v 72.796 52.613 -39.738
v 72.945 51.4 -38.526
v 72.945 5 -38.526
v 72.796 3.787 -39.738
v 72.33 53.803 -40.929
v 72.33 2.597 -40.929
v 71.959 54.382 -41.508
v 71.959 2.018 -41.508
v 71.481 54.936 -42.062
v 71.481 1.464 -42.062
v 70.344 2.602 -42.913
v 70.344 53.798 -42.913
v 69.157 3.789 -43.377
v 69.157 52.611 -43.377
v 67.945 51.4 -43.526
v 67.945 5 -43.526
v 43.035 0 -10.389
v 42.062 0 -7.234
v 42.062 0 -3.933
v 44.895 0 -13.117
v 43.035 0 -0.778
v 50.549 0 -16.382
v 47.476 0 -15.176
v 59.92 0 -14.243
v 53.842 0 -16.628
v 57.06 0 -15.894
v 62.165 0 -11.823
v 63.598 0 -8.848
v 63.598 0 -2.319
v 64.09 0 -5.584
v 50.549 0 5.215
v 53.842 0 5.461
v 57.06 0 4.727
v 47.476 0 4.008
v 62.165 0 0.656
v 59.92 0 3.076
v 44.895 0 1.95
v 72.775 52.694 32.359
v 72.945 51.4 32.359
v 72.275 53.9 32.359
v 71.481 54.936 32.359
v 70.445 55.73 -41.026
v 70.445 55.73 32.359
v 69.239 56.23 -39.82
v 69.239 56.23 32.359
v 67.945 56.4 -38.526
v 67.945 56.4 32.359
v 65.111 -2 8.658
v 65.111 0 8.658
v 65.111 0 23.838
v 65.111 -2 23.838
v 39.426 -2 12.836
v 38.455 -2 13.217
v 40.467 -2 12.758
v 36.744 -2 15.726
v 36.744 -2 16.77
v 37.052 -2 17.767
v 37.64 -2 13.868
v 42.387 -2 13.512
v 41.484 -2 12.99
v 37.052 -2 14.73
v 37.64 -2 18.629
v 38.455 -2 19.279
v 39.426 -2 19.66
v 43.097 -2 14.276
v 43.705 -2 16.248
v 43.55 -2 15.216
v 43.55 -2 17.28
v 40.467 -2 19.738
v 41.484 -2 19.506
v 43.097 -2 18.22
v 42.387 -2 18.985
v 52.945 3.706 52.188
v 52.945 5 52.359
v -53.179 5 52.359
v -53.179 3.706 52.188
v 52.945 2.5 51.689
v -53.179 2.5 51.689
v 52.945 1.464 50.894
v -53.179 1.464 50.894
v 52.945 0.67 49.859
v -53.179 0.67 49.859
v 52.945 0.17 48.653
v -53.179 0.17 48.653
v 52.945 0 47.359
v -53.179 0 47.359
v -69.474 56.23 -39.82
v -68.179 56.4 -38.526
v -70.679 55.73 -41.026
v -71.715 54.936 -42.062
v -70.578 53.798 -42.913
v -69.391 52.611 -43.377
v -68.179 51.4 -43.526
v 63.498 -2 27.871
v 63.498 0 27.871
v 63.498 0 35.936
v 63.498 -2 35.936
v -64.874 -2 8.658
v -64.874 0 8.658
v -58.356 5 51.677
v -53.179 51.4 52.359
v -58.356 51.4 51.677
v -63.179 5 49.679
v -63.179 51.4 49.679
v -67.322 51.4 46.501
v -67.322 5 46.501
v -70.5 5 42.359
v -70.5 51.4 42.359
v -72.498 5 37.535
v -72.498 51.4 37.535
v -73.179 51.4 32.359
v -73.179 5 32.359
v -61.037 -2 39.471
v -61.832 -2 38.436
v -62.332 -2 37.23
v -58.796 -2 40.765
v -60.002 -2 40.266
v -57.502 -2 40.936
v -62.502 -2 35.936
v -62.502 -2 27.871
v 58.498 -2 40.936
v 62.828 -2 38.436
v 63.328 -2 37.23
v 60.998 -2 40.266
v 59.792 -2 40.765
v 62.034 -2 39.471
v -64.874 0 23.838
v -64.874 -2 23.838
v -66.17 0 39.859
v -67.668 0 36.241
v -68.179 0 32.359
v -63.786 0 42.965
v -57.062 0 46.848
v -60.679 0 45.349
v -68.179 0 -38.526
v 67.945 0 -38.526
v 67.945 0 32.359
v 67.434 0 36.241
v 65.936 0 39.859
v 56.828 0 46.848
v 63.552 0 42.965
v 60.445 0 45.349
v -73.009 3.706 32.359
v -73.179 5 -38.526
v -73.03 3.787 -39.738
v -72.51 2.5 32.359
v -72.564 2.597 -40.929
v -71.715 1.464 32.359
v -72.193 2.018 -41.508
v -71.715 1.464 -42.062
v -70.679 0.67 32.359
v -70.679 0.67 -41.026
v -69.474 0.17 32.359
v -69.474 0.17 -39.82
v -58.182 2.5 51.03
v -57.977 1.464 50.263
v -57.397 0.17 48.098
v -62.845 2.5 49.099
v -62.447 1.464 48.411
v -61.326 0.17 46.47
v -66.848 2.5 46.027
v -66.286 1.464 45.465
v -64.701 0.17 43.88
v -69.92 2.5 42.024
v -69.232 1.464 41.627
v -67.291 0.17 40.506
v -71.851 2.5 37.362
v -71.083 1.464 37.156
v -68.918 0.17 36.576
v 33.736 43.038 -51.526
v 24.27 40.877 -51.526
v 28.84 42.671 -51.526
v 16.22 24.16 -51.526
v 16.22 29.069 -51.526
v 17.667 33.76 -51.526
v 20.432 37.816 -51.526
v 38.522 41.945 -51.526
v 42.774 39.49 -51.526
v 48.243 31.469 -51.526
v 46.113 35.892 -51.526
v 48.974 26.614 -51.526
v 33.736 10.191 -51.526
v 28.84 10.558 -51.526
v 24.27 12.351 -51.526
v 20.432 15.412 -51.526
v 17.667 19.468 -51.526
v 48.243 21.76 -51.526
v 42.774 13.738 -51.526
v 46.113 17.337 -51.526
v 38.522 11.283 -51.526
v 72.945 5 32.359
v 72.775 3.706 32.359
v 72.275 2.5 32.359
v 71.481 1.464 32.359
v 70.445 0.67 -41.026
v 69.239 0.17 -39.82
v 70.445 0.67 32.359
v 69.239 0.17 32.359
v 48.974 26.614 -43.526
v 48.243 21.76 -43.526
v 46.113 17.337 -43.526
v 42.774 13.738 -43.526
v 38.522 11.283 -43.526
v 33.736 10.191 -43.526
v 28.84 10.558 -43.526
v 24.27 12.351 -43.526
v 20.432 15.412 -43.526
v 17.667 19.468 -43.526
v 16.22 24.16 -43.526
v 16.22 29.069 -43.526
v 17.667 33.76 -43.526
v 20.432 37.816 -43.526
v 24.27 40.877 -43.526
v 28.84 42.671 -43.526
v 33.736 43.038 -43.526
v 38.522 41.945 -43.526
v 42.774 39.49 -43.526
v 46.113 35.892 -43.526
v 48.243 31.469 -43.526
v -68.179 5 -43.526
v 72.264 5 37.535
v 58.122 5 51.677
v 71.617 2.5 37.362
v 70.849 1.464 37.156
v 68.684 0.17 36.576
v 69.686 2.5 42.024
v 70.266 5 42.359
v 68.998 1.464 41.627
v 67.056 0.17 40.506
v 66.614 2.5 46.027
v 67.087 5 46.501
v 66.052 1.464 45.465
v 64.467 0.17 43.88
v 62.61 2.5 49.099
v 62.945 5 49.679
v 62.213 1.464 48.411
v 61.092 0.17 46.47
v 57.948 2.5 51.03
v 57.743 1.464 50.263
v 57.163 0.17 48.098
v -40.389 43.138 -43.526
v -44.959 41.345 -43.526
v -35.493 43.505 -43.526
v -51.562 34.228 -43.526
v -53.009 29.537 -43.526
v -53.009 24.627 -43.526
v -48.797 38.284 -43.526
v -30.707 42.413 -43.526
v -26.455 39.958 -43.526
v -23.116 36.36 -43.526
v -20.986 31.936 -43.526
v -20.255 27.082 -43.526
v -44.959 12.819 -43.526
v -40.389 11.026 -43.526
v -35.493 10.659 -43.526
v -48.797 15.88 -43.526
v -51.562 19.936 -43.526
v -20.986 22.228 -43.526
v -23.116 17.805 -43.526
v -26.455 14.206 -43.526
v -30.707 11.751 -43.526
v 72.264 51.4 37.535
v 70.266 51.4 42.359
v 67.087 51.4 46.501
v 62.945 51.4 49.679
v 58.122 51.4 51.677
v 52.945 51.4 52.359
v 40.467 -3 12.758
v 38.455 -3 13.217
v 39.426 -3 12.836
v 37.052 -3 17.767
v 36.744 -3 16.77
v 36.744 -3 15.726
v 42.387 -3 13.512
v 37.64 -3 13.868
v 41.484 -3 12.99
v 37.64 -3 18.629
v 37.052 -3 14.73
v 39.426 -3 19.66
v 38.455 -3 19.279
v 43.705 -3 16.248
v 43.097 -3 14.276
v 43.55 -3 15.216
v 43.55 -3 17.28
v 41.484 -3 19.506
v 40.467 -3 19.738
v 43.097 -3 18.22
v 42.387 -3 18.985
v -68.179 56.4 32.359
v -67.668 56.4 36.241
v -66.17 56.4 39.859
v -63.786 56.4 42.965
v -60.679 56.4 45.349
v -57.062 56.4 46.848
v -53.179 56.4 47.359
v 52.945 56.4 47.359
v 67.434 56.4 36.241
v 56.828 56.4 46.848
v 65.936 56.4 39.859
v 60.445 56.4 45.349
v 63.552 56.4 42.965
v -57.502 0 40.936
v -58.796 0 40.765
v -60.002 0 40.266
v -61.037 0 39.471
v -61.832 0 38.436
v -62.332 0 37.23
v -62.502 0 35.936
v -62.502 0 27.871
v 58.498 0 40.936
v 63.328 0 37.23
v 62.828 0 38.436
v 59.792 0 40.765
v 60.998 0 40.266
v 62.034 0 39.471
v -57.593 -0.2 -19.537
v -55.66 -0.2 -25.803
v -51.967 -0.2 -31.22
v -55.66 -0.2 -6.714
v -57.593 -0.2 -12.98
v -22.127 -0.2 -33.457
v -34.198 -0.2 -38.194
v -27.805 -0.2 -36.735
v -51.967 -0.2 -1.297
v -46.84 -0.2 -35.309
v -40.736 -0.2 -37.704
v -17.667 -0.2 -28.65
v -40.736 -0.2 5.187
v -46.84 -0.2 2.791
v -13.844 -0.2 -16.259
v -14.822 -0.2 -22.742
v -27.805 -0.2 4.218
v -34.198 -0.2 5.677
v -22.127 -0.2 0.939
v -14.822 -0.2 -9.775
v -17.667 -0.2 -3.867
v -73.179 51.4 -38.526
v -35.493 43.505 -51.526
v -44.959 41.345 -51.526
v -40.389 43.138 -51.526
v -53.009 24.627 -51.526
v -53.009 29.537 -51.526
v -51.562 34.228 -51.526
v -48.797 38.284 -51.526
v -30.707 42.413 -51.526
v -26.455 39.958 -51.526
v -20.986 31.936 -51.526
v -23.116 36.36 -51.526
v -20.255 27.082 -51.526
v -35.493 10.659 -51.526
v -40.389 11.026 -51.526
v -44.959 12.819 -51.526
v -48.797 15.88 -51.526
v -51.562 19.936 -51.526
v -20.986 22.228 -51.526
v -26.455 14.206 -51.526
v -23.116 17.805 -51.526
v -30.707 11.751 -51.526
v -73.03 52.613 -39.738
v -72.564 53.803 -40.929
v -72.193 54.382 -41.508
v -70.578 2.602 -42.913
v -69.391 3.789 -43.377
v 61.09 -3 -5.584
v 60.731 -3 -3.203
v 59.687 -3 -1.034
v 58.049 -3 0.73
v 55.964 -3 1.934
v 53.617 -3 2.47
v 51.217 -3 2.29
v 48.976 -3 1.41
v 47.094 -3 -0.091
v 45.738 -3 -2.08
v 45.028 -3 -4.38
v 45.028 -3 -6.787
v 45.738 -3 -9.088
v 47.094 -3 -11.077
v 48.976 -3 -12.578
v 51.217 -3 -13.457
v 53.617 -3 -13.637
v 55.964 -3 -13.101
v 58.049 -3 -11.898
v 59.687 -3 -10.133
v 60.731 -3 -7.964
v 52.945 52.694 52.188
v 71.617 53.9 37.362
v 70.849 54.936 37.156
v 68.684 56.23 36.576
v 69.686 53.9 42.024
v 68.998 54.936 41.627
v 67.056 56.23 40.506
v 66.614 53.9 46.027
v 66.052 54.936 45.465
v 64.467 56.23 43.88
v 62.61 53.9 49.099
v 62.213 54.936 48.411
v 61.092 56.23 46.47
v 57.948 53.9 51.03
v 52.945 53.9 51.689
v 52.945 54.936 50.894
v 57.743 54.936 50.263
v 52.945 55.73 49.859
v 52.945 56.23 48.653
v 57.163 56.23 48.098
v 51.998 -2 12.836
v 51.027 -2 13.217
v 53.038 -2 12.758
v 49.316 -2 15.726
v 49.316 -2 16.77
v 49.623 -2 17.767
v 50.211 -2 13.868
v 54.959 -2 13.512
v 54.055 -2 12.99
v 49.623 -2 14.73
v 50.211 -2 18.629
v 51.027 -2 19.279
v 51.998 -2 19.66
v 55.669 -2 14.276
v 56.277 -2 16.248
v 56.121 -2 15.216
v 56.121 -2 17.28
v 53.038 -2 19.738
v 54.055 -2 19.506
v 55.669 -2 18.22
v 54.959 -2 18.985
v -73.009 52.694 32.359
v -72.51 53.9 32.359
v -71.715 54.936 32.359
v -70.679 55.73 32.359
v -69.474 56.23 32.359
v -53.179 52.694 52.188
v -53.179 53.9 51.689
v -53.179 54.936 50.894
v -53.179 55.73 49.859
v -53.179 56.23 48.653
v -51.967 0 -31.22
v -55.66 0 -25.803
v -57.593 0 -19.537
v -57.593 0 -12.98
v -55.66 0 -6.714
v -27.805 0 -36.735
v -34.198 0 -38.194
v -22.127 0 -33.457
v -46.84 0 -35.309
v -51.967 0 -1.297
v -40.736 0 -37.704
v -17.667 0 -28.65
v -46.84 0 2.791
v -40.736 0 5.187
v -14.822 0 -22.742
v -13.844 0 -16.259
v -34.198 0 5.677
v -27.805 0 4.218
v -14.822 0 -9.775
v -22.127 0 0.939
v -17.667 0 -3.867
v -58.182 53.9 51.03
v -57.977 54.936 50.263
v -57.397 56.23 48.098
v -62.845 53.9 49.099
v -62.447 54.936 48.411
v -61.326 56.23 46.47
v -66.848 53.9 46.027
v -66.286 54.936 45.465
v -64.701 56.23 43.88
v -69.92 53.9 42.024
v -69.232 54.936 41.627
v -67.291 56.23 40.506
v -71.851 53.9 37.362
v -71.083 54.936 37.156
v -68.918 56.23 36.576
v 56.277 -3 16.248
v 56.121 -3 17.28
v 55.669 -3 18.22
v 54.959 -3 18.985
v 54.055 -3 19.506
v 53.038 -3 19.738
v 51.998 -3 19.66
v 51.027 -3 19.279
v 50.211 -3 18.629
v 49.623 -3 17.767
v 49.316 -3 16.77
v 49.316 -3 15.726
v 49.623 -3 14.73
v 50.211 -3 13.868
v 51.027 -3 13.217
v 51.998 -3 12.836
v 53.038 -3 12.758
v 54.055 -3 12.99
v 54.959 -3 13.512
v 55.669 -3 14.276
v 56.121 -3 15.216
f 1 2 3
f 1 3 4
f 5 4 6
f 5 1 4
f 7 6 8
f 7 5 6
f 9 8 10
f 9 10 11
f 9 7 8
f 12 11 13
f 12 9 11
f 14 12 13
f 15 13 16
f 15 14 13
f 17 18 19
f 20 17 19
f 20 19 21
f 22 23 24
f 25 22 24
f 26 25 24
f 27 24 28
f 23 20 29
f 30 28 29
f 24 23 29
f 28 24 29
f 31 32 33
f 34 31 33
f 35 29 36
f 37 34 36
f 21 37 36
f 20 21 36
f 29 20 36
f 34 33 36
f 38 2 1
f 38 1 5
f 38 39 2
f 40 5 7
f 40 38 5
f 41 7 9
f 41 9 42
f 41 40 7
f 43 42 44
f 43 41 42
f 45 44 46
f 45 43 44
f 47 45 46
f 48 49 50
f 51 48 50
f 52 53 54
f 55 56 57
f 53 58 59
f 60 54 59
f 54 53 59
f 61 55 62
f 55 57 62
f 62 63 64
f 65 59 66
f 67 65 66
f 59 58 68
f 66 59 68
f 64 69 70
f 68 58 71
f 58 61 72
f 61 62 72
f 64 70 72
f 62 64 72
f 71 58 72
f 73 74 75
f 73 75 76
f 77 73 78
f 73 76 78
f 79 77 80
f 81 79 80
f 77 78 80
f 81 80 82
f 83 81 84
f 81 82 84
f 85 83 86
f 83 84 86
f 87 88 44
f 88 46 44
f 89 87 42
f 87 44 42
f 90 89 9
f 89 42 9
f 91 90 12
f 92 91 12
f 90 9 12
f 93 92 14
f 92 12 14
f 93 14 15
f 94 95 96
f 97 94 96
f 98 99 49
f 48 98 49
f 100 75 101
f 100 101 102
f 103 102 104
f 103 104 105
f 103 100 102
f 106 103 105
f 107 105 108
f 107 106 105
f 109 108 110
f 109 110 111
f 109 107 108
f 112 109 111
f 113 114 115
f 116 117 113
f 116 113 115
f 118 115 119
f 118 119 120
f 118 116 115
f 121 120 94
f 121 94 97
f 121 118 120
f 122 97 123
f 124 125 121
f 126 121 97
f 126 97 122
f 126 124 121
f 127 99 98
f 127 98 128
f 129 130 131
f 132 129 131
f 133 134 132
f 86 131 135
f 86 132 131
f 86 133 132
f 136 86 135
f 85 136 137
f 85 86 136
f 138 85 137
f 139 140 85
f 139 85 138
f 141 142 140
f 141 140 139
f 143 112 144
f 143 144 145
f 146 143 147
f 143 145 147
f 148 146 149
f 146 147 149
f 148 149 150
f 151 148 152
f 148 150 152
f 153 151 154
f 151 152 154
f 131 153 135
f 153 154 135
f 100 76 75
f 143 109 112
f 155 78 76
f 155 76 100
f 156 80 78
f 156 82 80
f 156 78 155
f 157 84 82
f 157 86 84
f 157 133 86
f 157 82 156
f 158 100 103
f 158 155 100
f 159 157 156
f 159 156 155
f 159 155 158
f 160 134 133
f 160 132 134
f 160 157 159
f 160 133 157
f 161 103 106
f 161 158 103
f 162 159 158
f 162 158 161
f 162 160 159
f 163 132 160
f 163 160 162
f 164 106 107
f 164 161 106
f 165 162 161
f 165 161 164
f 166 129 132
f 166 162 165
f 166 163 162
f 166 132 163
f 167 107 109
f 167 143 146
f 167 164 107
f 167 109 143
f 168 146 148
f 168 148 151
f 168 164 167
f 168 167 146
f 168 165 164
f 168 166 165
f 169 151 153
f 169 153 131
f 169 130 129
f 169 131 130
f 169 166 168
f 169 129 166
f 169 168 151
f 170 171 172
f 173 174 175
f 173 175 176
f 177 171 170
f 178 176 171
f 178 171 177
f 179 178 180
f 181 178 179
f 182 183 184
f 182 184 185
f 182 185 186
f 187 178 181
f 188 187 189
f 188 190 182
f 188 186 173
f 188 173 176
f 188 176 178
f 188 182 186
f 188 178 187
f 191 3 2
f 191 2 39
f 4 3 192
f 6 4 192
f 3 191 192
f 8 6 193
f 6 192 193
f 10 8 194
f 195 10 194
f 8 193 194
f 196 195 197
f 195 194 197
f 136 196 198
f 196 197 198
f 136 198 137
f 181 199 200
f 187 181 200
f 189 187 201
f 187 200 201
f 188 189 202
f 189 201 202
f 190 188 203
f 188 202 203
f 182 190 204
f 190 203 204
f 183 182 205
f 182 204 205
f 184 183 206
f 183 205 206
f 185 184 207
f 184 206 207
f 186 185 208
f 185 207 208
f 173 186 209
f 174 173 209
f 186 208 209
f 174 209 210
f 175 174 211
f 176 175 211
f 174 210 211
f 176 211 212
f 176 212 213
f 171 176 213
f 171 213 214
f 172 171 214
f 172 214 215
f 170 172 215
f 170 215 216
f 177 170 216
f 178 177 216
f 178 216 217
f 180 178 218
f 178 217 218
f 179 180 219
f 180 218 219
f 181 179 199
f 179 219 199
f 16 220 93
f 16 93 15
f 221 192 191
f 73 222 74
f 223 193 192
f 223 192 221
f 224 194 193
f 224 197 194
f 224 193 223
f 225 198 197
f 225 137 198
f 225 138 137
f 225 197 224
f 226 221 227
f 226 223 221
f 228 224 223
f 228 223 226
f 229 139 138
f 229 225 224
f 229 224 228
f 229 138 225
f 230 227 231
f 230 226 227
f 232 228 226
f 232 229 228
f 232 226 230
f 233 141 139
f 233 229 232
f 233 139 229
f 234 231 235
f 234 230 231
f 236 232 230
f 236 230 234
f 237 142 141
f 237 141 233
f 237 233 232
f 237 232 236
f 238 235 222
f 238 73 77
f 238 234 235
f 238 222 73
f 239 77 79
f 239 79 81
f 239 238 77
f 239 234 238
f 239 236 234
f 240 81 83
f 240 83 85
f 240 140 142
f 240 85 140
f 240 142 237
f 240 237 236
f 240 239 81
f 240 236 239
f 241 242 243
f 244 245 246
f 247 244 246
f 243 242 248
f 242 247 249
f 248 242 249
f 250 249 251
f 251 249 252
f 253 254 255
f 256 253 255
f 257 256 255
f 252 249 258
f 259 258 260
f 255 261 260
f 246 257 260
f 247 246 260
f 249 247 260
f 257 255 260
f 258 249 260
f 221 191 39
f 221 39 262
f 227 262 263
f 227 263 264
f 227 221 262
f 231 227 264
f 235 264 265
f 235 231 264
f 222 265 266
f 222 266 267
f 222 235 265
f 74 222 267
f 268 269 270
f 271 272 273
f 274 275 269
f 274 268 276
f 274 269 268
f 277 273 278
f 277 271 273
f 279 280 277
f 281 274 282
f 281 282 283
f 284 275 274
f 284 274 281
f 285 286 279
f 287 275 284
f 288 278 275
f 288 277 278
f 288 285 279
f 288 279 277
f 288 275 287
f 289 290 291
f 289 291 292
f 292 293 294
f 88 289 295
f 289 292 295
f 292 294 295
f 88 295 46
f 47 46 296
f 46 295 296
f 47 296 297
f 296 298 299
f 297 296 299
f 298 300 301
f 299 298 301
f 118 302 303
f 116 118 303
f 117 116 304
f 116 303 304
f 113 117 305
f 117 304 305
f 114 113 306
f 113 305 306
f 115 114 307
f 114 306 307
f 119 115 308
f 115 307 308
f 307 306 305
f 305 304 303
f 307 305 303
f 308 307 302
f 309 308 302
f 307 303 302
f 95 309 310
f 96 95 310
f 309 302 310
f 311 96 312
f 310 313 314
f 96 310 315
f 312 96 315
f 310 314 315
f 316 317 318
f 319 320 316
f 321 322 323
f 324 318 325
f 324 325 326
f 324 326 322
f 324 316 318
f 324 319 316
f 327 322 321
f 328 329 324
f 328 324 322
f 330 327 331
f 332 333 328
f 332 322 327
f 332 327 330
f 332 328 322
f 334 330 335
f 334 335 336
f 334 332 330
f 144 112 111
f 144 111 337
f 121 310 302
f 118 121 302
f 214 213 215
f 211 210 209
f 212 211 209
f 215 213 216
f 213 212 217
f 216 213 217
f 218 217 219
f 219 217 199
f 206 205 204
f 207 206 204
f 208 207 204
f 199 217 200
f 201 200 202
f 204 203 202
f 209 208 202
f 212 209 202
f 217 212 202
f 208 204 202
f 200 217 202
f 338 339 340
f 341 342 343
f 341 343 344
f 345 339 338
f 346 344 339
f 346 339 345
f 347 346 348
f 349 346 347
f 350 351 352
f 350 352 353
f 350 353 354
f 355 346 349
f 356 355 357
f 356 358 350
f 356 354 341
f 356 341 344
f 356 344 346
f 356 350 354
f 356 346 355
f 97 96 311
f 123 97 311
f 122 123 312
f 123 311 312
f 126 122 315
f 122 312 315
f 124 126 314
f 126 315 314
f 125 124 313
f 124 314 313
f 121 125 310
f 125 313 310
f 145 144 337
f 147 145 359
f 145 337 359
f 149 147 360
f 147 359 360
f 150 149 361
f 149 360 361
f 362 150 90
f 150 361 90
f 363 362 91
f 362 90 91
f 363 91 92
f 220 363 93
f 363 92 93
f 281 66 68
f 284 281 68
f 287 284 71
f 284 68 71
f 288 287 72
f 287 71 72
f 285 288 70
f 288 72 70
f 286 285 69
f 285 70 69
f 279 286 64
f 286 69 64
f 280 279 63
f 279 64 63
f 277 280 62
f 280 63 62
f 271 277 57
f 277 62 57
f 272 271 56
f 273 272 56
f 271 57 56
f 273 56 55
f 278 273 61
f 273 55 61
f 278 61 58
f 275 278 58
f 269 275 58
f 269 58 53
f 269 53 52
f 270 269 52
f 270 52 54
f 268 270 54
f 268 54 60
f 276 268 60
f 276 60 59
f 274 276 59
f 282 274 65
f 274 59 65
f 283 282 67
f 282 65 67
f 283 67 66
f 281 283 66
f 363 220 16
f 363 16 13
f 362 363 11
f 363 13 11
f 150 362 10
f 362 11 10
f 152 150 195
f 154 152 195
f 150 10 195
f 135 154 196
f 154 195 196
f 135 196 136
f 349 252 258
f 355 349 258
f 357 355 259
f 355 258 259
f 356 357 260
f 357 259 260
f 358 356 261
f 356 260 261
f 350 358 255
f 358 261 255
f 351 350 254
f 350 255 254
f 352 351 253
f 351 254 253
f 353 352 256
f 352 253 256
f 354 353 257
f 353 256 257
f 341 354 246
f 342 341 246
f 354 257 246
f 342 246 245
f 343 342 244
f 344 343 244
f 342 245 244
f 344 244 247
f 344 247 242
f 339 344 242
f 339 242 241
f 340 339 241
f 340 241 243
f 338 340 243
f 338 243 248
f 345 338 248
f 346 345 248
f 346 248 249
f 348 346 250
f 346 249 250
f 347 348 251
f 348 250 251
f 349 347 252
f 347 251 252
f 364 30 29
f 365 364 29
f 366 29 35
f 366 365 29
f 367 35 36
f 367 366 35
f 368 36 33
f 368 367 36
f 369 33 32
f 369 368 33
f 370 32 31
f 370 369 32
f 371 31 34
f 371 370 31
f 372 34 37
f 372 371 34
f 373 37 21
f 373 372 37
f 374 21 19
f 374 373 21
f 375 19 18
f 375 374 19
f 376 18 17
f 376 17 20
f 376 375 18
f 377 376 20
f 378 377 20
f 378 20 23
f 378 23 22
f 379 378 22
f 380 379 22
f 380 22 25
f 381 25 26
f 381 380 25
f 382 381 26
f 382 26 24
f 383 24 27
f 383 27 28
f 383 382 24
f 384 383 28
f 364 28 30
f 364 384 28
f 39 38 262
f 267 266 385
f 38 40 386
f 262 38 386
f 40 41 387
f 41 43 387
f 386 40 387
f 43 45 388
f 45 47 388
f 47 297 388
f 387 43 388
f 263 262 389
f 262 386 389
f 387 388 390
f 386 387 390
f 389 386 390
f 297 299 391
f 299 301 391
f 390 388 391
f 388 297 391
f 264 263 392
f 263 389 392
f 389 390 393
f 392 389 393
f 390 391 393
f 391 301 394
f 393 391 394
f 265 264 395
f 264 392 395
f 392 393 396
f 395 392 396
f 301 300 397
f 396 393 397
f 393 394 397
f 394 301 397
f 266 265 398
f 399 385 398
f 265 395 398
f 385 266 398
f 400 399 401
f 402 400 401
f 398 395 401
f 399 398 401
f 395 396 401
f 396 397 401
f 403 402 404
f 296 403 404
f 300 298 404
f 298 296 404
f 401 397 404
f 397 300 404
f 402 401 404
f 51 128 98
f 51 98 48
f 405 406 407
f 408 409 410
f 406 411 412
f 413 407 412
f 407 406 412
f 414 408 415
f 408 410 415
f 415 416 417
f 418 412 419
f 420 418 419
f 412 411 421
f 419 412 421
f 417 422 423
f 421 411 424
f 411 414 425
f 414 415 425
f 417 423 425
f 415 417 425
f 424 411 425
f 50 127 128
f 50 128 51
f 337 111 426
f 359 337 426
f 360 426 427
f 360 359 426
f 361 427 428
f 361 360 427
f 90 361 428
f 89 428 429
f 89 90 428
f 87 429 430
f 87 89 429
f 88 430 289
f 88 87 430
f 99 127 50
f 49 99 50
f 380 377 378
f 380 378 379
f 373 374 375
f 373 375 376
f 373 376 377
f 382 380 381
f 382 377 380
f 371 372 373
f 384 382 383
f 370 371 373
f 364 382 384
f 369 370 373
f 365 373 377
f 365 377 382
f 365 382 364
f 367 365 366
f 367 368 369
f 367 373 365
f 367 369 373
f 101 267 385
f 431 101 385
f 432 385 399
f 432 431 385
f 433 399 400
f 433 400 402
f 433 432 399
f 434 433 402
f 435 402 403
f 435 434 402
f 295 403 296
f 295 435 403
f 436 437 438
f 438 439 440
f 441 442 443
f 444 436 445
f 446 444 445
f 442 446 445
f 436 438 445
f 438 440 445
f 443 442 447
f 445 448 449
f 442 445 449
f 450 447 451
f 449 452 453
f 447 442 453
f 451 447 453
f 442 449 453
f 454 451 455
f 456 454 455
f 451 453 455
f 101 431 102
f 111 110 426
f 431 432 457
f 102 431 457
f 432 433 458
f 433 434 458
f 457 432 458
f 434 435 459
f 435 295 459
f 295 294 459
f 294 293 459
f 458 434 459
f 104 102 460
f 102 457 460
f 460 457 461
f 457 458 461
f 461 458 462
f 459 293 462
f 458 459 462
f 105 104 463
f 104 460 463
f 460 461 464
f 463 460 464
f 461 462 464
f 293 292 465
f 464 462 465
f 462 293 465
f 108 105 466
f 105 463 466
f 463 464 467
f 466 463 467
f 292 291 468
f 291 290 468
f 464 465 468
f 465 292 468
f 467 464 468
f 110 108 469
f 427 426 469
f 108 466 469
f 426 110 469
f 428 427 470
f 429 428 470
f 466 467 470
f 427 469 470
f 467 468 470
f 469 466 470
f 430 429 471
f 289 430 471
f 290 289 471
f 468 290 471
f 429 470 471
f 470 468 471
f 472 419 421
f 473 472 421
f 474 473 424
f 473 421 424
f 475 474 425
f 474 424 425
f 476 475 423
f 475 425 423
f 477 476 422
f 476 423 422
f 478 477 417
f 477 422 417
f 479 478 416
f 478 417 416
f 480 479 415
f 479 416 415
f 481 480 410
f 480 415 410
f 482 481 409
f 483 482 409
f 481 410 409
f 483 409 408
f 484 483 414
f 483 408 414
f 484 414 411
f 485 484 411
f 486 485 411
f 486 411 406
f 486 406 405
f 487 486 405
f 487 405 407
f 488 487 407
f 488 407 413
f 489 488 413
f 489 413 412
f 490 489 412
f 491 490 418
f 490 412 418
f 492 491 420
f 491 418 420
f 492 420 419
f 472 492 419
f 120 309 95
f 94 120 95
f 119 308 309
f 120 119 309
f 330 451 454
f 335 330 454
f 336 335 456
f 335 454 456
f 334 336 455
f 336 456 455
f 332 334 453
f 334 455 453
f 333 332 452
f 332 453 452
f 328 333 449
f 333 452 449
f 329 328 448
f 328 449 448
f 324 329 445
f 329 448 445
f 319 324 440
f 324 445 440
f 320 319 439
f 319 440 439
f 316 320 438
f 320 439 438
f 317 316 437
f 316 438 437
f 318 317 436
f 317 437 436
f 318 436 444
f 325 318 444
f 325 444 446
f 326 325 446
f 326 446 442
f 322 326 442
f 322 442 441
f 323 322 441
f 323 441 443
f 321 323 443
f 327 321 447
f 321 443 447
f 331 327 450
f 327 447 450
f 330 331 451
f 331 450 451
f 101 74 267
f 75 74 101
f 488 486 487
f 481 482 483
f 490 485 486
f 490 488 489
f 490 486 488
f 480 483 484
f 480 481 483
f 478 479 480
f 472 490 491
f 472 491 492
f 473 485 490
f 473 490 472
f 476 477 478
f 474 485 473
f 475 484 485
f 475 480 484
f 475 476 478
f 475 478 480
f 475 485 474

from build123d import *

# Parameters (mm, degrees)
F1_DEPTH     = 56.4
F4_W         = 129.9849450588
F4_H         = 15.1807228103
F5_DEPTH     = 2
F6_R         = 3.5
F7_DEPTH     = 1
F2_R         = 16.4693442444
F8_DEPTH     = 8
F3_R         = 13.0758852418
F9_DEPTH     = 3
F11_DEPTH    = 2
F34_R        = 5
F35_R        = 5
F36_T1_DEPTH = 71.4
F37_T1_DEPTH = 71.4
F40_R        = 21.9971090936
F41_DEPTH    = 0.2


# Not quite as in the source:
# - a fillet or chamfer that OpenCascade refuses, or shapes differently, is made with other operations: its cross-section is extruded or revolved along the edge and cut away or added
# - the program builds the solid bodies; features that only make, move or delete a surface that nothing else refers to are left out


with BuildPart() as f1:
    # F0 (on Front) → F1 (new body)
    with BuildSketch(Plane.XZ):
        with BuildLine():
            Line((52.9453340173, 52.3588129878), (-53.1794461608, 52.3588129878))
            ThreePointArc((-53.1794461608, 52.3588129878), (-67.3215817845, 46.5009486115), (-73.1794461608, 32.3588129878))
            Line((-73.1794461608, 32.3588129878), (-73.1794461608, -43.5259789228))
            Line((-73.1794461608, -43.5259789228), (72.9453340173, -43.5259789228))
            Line((72.9453340173, -43.5259789228), (72.9453340173, 32.3588129878))
            ThreePointArc((72.9453340173, 32.3588129878), (67.087469641, 46.5009486115), (52.9453340173, 52.3588129878))
        make_face()
    extrude(amount=-F1_DEPTH)

    # F34
    f34_edges = [f1.edges().sort_by_distance(p)[0] for p in [
        (-0.117056, 0, 52.358813),
        (-67.321582, 0, 46.500949),
        (-73.179446, 0, -5.583583),
        (-0.117056, 0, -43.525979),
        (72.945334, 0, -5.583583),
        (67.08747, 0, 46.500949),
    ]]
    fillet(f34_edges, radius=F34_R)

    # F35
    f35_edges = [f1.edges().sort_by_distance(p)[0] for p in [
        (-0.117056, 56.4, 52.358813),
        (-67.321582, 56.4, 46.500949),
        (-73.179446, 56.4, -5.583583),
        (-0.117056, 56.4, -43.525979),
        (72.945334, 56.4, -5.583583),
        (67.08747, 56.4, 46.500949),
    ]]
    fillet(f35_edges, radius=F35_R)

    # F36: fillet of radius 5 on 4 edges, made by hand

    # F36_s2 → F36_t1 (cut)
    with BuildSketch(Plane.XZ.offset(-63.9)):
        with BuildLine():
            ThreePointArc((72.9453340173, -38.5259789228), (71.4808679232, -42.0615128288), (67.9453340173, -43.5259789228))
            Line((67.9453340173, -43.5259789228), (72.9453340173, -43.5259789228))
            Line((72.9453340173, -43.5259789228), (72.9453340173, -38.5259789228))
        make_face()
    extrude(amount=F36_T1_DEPTH, mode=Mode.SUBTRACT)

    # F37: fillet of radius 5 on 4 edges, made by hand

    # F37_s2 → F37_t1 (cut)
    with BuildSketch(Plane.XZ.offset(-63.9)):
        with BuildLine():
            ThreePointArc((-73.1794461608, -38.5259789228), (-71.7149800667, -42.0615128288), (-68.1794461608, -43.5259789228))
            Line((-68.1794461608, -43.5259789228), (-73.1794461608, -43.5259789228))
            Line((-73.1794461608, -43.5259789228), (-73.1794461608, -38.5259789228))
        make_face()
    extrude(amount=F37_T1_DEPTH, mode=Mode.SUBTRACT)


with BuildPart() as f5:
    # F4 (on face) → F5 (new body)
    with BuildSketch(Plane.XZ):
        with Locations((0.1185983419, 16.2481176667)):
            Rectangle(F4_W, F4_H)
    extrude(amount=F5_DEPTH)


with BuildPart() as f7:
    # F6 (on face) → F7 (new body)
    with BuildSketch(Plane.XZ.offset(2)):
        with Locations((52.7767315507, 16.2481181324)):
            Circle(F6_R)
    extrude(amount=F7_DEPTH)


with BuildPart() as f7b:
    # F6 (on face) → F7, piece 2 (new body)
    with BuildSketch(Plane.XZ.offset(2)):
        with Locations((40.2051955462, 16.2481181324)):
            Circle(F6_R)
    extrude(amount=F7_DEPTH)


with BuildPart() as f8:
    # F2 (on face) → F8 (new body)
    with BuildSketch(Plane(origin=(0, 0, -43.5259789228), x_dir=(1, 0, 0), z_dir=(0, 0, -1))):
        with Locations((-36.7238521576, -27.0820427686)):
            Circle(F2_R)
    extrude(amount=F8_DEPTH)


with BuildPart() as f8b:
    # F2 (on face) → F8, piece 2 (new body)
    with BuildSketch(Plane(origin=(0, 0, -43.5259789228), x_dir=(1, 0, 0), z_dir=(0, 0, -1))):
        with Locations((32.5050577521, -26.614209637)):
            Circle(F2_R)
    extrude(amount=F8_DEPTH)


with BuildPart() as f9:
    # F3 (on face) → F9 (new body)
    with BuildSketch(Plane.XZ):
        with Locations((53.0139356852, -5.5835829675)):
            Circle(F3_R)
    extrude(amount=F9_DEPTH)

    # F29: chamfer of 5 on 1 edges, made by hand

    # F29_s1 → F29_t2 (revolve, cut)
    with BuildSketch(Plane.XY.offset(-5.5835829675)):
        Polygon((66.089820927, 2), (61.089820927, -3), (66.089820927, -3), align=None)
    revolve(axis=Axis((53.0139356852, -3, -5.5835829675), (0, -1, 0)), mode=Mode.SUBTRACT)


with BuildPart() as f11:
    # F10 (on face) → F11 (new body)
    with BuildSketch(Plane.XZ):
        with BuildLine():
            Line((58.4981150031, 40.9356179833), (-57.5018849969, 40.9356179833))
            ThreePointArc((-57.5018849969, 40.9356179833), (-61.0374189028, 39.4711518893), (-62.5018849969, 35.9356179833))
            Line((-62.5018849969, 35.9356179833), (-62.5018849969, 27.8708599508))
            Line((-62.5018849969, 27.8708599508), (63.4981150031, 27.8708599508))
            Line((63.4981150031, 27.8708599508), (63.4981150031, 35.9356179833))
            ThreePointArc((63.4981150031, 35.9356179833), (62.033648909, 39.4711518893), (58.4981150031, 40.9356179833))
        make_face()
    extrude(amount=F11_DEPTH)


with BuildPart() as f41:
    # F40 (on face) → F41 (new body)
    with BuildSketch(Plane.XZ):
        with Locations((-35.8415655792, -16.2585619837)):
            Circle(F40_R)
    extrude(amount=F41_DEPTH)


solid = Compound([f1.part, f5.part, f7.part, f7b.part, f8.part, f8b.part, f9.part, f11.part, f41.part])
